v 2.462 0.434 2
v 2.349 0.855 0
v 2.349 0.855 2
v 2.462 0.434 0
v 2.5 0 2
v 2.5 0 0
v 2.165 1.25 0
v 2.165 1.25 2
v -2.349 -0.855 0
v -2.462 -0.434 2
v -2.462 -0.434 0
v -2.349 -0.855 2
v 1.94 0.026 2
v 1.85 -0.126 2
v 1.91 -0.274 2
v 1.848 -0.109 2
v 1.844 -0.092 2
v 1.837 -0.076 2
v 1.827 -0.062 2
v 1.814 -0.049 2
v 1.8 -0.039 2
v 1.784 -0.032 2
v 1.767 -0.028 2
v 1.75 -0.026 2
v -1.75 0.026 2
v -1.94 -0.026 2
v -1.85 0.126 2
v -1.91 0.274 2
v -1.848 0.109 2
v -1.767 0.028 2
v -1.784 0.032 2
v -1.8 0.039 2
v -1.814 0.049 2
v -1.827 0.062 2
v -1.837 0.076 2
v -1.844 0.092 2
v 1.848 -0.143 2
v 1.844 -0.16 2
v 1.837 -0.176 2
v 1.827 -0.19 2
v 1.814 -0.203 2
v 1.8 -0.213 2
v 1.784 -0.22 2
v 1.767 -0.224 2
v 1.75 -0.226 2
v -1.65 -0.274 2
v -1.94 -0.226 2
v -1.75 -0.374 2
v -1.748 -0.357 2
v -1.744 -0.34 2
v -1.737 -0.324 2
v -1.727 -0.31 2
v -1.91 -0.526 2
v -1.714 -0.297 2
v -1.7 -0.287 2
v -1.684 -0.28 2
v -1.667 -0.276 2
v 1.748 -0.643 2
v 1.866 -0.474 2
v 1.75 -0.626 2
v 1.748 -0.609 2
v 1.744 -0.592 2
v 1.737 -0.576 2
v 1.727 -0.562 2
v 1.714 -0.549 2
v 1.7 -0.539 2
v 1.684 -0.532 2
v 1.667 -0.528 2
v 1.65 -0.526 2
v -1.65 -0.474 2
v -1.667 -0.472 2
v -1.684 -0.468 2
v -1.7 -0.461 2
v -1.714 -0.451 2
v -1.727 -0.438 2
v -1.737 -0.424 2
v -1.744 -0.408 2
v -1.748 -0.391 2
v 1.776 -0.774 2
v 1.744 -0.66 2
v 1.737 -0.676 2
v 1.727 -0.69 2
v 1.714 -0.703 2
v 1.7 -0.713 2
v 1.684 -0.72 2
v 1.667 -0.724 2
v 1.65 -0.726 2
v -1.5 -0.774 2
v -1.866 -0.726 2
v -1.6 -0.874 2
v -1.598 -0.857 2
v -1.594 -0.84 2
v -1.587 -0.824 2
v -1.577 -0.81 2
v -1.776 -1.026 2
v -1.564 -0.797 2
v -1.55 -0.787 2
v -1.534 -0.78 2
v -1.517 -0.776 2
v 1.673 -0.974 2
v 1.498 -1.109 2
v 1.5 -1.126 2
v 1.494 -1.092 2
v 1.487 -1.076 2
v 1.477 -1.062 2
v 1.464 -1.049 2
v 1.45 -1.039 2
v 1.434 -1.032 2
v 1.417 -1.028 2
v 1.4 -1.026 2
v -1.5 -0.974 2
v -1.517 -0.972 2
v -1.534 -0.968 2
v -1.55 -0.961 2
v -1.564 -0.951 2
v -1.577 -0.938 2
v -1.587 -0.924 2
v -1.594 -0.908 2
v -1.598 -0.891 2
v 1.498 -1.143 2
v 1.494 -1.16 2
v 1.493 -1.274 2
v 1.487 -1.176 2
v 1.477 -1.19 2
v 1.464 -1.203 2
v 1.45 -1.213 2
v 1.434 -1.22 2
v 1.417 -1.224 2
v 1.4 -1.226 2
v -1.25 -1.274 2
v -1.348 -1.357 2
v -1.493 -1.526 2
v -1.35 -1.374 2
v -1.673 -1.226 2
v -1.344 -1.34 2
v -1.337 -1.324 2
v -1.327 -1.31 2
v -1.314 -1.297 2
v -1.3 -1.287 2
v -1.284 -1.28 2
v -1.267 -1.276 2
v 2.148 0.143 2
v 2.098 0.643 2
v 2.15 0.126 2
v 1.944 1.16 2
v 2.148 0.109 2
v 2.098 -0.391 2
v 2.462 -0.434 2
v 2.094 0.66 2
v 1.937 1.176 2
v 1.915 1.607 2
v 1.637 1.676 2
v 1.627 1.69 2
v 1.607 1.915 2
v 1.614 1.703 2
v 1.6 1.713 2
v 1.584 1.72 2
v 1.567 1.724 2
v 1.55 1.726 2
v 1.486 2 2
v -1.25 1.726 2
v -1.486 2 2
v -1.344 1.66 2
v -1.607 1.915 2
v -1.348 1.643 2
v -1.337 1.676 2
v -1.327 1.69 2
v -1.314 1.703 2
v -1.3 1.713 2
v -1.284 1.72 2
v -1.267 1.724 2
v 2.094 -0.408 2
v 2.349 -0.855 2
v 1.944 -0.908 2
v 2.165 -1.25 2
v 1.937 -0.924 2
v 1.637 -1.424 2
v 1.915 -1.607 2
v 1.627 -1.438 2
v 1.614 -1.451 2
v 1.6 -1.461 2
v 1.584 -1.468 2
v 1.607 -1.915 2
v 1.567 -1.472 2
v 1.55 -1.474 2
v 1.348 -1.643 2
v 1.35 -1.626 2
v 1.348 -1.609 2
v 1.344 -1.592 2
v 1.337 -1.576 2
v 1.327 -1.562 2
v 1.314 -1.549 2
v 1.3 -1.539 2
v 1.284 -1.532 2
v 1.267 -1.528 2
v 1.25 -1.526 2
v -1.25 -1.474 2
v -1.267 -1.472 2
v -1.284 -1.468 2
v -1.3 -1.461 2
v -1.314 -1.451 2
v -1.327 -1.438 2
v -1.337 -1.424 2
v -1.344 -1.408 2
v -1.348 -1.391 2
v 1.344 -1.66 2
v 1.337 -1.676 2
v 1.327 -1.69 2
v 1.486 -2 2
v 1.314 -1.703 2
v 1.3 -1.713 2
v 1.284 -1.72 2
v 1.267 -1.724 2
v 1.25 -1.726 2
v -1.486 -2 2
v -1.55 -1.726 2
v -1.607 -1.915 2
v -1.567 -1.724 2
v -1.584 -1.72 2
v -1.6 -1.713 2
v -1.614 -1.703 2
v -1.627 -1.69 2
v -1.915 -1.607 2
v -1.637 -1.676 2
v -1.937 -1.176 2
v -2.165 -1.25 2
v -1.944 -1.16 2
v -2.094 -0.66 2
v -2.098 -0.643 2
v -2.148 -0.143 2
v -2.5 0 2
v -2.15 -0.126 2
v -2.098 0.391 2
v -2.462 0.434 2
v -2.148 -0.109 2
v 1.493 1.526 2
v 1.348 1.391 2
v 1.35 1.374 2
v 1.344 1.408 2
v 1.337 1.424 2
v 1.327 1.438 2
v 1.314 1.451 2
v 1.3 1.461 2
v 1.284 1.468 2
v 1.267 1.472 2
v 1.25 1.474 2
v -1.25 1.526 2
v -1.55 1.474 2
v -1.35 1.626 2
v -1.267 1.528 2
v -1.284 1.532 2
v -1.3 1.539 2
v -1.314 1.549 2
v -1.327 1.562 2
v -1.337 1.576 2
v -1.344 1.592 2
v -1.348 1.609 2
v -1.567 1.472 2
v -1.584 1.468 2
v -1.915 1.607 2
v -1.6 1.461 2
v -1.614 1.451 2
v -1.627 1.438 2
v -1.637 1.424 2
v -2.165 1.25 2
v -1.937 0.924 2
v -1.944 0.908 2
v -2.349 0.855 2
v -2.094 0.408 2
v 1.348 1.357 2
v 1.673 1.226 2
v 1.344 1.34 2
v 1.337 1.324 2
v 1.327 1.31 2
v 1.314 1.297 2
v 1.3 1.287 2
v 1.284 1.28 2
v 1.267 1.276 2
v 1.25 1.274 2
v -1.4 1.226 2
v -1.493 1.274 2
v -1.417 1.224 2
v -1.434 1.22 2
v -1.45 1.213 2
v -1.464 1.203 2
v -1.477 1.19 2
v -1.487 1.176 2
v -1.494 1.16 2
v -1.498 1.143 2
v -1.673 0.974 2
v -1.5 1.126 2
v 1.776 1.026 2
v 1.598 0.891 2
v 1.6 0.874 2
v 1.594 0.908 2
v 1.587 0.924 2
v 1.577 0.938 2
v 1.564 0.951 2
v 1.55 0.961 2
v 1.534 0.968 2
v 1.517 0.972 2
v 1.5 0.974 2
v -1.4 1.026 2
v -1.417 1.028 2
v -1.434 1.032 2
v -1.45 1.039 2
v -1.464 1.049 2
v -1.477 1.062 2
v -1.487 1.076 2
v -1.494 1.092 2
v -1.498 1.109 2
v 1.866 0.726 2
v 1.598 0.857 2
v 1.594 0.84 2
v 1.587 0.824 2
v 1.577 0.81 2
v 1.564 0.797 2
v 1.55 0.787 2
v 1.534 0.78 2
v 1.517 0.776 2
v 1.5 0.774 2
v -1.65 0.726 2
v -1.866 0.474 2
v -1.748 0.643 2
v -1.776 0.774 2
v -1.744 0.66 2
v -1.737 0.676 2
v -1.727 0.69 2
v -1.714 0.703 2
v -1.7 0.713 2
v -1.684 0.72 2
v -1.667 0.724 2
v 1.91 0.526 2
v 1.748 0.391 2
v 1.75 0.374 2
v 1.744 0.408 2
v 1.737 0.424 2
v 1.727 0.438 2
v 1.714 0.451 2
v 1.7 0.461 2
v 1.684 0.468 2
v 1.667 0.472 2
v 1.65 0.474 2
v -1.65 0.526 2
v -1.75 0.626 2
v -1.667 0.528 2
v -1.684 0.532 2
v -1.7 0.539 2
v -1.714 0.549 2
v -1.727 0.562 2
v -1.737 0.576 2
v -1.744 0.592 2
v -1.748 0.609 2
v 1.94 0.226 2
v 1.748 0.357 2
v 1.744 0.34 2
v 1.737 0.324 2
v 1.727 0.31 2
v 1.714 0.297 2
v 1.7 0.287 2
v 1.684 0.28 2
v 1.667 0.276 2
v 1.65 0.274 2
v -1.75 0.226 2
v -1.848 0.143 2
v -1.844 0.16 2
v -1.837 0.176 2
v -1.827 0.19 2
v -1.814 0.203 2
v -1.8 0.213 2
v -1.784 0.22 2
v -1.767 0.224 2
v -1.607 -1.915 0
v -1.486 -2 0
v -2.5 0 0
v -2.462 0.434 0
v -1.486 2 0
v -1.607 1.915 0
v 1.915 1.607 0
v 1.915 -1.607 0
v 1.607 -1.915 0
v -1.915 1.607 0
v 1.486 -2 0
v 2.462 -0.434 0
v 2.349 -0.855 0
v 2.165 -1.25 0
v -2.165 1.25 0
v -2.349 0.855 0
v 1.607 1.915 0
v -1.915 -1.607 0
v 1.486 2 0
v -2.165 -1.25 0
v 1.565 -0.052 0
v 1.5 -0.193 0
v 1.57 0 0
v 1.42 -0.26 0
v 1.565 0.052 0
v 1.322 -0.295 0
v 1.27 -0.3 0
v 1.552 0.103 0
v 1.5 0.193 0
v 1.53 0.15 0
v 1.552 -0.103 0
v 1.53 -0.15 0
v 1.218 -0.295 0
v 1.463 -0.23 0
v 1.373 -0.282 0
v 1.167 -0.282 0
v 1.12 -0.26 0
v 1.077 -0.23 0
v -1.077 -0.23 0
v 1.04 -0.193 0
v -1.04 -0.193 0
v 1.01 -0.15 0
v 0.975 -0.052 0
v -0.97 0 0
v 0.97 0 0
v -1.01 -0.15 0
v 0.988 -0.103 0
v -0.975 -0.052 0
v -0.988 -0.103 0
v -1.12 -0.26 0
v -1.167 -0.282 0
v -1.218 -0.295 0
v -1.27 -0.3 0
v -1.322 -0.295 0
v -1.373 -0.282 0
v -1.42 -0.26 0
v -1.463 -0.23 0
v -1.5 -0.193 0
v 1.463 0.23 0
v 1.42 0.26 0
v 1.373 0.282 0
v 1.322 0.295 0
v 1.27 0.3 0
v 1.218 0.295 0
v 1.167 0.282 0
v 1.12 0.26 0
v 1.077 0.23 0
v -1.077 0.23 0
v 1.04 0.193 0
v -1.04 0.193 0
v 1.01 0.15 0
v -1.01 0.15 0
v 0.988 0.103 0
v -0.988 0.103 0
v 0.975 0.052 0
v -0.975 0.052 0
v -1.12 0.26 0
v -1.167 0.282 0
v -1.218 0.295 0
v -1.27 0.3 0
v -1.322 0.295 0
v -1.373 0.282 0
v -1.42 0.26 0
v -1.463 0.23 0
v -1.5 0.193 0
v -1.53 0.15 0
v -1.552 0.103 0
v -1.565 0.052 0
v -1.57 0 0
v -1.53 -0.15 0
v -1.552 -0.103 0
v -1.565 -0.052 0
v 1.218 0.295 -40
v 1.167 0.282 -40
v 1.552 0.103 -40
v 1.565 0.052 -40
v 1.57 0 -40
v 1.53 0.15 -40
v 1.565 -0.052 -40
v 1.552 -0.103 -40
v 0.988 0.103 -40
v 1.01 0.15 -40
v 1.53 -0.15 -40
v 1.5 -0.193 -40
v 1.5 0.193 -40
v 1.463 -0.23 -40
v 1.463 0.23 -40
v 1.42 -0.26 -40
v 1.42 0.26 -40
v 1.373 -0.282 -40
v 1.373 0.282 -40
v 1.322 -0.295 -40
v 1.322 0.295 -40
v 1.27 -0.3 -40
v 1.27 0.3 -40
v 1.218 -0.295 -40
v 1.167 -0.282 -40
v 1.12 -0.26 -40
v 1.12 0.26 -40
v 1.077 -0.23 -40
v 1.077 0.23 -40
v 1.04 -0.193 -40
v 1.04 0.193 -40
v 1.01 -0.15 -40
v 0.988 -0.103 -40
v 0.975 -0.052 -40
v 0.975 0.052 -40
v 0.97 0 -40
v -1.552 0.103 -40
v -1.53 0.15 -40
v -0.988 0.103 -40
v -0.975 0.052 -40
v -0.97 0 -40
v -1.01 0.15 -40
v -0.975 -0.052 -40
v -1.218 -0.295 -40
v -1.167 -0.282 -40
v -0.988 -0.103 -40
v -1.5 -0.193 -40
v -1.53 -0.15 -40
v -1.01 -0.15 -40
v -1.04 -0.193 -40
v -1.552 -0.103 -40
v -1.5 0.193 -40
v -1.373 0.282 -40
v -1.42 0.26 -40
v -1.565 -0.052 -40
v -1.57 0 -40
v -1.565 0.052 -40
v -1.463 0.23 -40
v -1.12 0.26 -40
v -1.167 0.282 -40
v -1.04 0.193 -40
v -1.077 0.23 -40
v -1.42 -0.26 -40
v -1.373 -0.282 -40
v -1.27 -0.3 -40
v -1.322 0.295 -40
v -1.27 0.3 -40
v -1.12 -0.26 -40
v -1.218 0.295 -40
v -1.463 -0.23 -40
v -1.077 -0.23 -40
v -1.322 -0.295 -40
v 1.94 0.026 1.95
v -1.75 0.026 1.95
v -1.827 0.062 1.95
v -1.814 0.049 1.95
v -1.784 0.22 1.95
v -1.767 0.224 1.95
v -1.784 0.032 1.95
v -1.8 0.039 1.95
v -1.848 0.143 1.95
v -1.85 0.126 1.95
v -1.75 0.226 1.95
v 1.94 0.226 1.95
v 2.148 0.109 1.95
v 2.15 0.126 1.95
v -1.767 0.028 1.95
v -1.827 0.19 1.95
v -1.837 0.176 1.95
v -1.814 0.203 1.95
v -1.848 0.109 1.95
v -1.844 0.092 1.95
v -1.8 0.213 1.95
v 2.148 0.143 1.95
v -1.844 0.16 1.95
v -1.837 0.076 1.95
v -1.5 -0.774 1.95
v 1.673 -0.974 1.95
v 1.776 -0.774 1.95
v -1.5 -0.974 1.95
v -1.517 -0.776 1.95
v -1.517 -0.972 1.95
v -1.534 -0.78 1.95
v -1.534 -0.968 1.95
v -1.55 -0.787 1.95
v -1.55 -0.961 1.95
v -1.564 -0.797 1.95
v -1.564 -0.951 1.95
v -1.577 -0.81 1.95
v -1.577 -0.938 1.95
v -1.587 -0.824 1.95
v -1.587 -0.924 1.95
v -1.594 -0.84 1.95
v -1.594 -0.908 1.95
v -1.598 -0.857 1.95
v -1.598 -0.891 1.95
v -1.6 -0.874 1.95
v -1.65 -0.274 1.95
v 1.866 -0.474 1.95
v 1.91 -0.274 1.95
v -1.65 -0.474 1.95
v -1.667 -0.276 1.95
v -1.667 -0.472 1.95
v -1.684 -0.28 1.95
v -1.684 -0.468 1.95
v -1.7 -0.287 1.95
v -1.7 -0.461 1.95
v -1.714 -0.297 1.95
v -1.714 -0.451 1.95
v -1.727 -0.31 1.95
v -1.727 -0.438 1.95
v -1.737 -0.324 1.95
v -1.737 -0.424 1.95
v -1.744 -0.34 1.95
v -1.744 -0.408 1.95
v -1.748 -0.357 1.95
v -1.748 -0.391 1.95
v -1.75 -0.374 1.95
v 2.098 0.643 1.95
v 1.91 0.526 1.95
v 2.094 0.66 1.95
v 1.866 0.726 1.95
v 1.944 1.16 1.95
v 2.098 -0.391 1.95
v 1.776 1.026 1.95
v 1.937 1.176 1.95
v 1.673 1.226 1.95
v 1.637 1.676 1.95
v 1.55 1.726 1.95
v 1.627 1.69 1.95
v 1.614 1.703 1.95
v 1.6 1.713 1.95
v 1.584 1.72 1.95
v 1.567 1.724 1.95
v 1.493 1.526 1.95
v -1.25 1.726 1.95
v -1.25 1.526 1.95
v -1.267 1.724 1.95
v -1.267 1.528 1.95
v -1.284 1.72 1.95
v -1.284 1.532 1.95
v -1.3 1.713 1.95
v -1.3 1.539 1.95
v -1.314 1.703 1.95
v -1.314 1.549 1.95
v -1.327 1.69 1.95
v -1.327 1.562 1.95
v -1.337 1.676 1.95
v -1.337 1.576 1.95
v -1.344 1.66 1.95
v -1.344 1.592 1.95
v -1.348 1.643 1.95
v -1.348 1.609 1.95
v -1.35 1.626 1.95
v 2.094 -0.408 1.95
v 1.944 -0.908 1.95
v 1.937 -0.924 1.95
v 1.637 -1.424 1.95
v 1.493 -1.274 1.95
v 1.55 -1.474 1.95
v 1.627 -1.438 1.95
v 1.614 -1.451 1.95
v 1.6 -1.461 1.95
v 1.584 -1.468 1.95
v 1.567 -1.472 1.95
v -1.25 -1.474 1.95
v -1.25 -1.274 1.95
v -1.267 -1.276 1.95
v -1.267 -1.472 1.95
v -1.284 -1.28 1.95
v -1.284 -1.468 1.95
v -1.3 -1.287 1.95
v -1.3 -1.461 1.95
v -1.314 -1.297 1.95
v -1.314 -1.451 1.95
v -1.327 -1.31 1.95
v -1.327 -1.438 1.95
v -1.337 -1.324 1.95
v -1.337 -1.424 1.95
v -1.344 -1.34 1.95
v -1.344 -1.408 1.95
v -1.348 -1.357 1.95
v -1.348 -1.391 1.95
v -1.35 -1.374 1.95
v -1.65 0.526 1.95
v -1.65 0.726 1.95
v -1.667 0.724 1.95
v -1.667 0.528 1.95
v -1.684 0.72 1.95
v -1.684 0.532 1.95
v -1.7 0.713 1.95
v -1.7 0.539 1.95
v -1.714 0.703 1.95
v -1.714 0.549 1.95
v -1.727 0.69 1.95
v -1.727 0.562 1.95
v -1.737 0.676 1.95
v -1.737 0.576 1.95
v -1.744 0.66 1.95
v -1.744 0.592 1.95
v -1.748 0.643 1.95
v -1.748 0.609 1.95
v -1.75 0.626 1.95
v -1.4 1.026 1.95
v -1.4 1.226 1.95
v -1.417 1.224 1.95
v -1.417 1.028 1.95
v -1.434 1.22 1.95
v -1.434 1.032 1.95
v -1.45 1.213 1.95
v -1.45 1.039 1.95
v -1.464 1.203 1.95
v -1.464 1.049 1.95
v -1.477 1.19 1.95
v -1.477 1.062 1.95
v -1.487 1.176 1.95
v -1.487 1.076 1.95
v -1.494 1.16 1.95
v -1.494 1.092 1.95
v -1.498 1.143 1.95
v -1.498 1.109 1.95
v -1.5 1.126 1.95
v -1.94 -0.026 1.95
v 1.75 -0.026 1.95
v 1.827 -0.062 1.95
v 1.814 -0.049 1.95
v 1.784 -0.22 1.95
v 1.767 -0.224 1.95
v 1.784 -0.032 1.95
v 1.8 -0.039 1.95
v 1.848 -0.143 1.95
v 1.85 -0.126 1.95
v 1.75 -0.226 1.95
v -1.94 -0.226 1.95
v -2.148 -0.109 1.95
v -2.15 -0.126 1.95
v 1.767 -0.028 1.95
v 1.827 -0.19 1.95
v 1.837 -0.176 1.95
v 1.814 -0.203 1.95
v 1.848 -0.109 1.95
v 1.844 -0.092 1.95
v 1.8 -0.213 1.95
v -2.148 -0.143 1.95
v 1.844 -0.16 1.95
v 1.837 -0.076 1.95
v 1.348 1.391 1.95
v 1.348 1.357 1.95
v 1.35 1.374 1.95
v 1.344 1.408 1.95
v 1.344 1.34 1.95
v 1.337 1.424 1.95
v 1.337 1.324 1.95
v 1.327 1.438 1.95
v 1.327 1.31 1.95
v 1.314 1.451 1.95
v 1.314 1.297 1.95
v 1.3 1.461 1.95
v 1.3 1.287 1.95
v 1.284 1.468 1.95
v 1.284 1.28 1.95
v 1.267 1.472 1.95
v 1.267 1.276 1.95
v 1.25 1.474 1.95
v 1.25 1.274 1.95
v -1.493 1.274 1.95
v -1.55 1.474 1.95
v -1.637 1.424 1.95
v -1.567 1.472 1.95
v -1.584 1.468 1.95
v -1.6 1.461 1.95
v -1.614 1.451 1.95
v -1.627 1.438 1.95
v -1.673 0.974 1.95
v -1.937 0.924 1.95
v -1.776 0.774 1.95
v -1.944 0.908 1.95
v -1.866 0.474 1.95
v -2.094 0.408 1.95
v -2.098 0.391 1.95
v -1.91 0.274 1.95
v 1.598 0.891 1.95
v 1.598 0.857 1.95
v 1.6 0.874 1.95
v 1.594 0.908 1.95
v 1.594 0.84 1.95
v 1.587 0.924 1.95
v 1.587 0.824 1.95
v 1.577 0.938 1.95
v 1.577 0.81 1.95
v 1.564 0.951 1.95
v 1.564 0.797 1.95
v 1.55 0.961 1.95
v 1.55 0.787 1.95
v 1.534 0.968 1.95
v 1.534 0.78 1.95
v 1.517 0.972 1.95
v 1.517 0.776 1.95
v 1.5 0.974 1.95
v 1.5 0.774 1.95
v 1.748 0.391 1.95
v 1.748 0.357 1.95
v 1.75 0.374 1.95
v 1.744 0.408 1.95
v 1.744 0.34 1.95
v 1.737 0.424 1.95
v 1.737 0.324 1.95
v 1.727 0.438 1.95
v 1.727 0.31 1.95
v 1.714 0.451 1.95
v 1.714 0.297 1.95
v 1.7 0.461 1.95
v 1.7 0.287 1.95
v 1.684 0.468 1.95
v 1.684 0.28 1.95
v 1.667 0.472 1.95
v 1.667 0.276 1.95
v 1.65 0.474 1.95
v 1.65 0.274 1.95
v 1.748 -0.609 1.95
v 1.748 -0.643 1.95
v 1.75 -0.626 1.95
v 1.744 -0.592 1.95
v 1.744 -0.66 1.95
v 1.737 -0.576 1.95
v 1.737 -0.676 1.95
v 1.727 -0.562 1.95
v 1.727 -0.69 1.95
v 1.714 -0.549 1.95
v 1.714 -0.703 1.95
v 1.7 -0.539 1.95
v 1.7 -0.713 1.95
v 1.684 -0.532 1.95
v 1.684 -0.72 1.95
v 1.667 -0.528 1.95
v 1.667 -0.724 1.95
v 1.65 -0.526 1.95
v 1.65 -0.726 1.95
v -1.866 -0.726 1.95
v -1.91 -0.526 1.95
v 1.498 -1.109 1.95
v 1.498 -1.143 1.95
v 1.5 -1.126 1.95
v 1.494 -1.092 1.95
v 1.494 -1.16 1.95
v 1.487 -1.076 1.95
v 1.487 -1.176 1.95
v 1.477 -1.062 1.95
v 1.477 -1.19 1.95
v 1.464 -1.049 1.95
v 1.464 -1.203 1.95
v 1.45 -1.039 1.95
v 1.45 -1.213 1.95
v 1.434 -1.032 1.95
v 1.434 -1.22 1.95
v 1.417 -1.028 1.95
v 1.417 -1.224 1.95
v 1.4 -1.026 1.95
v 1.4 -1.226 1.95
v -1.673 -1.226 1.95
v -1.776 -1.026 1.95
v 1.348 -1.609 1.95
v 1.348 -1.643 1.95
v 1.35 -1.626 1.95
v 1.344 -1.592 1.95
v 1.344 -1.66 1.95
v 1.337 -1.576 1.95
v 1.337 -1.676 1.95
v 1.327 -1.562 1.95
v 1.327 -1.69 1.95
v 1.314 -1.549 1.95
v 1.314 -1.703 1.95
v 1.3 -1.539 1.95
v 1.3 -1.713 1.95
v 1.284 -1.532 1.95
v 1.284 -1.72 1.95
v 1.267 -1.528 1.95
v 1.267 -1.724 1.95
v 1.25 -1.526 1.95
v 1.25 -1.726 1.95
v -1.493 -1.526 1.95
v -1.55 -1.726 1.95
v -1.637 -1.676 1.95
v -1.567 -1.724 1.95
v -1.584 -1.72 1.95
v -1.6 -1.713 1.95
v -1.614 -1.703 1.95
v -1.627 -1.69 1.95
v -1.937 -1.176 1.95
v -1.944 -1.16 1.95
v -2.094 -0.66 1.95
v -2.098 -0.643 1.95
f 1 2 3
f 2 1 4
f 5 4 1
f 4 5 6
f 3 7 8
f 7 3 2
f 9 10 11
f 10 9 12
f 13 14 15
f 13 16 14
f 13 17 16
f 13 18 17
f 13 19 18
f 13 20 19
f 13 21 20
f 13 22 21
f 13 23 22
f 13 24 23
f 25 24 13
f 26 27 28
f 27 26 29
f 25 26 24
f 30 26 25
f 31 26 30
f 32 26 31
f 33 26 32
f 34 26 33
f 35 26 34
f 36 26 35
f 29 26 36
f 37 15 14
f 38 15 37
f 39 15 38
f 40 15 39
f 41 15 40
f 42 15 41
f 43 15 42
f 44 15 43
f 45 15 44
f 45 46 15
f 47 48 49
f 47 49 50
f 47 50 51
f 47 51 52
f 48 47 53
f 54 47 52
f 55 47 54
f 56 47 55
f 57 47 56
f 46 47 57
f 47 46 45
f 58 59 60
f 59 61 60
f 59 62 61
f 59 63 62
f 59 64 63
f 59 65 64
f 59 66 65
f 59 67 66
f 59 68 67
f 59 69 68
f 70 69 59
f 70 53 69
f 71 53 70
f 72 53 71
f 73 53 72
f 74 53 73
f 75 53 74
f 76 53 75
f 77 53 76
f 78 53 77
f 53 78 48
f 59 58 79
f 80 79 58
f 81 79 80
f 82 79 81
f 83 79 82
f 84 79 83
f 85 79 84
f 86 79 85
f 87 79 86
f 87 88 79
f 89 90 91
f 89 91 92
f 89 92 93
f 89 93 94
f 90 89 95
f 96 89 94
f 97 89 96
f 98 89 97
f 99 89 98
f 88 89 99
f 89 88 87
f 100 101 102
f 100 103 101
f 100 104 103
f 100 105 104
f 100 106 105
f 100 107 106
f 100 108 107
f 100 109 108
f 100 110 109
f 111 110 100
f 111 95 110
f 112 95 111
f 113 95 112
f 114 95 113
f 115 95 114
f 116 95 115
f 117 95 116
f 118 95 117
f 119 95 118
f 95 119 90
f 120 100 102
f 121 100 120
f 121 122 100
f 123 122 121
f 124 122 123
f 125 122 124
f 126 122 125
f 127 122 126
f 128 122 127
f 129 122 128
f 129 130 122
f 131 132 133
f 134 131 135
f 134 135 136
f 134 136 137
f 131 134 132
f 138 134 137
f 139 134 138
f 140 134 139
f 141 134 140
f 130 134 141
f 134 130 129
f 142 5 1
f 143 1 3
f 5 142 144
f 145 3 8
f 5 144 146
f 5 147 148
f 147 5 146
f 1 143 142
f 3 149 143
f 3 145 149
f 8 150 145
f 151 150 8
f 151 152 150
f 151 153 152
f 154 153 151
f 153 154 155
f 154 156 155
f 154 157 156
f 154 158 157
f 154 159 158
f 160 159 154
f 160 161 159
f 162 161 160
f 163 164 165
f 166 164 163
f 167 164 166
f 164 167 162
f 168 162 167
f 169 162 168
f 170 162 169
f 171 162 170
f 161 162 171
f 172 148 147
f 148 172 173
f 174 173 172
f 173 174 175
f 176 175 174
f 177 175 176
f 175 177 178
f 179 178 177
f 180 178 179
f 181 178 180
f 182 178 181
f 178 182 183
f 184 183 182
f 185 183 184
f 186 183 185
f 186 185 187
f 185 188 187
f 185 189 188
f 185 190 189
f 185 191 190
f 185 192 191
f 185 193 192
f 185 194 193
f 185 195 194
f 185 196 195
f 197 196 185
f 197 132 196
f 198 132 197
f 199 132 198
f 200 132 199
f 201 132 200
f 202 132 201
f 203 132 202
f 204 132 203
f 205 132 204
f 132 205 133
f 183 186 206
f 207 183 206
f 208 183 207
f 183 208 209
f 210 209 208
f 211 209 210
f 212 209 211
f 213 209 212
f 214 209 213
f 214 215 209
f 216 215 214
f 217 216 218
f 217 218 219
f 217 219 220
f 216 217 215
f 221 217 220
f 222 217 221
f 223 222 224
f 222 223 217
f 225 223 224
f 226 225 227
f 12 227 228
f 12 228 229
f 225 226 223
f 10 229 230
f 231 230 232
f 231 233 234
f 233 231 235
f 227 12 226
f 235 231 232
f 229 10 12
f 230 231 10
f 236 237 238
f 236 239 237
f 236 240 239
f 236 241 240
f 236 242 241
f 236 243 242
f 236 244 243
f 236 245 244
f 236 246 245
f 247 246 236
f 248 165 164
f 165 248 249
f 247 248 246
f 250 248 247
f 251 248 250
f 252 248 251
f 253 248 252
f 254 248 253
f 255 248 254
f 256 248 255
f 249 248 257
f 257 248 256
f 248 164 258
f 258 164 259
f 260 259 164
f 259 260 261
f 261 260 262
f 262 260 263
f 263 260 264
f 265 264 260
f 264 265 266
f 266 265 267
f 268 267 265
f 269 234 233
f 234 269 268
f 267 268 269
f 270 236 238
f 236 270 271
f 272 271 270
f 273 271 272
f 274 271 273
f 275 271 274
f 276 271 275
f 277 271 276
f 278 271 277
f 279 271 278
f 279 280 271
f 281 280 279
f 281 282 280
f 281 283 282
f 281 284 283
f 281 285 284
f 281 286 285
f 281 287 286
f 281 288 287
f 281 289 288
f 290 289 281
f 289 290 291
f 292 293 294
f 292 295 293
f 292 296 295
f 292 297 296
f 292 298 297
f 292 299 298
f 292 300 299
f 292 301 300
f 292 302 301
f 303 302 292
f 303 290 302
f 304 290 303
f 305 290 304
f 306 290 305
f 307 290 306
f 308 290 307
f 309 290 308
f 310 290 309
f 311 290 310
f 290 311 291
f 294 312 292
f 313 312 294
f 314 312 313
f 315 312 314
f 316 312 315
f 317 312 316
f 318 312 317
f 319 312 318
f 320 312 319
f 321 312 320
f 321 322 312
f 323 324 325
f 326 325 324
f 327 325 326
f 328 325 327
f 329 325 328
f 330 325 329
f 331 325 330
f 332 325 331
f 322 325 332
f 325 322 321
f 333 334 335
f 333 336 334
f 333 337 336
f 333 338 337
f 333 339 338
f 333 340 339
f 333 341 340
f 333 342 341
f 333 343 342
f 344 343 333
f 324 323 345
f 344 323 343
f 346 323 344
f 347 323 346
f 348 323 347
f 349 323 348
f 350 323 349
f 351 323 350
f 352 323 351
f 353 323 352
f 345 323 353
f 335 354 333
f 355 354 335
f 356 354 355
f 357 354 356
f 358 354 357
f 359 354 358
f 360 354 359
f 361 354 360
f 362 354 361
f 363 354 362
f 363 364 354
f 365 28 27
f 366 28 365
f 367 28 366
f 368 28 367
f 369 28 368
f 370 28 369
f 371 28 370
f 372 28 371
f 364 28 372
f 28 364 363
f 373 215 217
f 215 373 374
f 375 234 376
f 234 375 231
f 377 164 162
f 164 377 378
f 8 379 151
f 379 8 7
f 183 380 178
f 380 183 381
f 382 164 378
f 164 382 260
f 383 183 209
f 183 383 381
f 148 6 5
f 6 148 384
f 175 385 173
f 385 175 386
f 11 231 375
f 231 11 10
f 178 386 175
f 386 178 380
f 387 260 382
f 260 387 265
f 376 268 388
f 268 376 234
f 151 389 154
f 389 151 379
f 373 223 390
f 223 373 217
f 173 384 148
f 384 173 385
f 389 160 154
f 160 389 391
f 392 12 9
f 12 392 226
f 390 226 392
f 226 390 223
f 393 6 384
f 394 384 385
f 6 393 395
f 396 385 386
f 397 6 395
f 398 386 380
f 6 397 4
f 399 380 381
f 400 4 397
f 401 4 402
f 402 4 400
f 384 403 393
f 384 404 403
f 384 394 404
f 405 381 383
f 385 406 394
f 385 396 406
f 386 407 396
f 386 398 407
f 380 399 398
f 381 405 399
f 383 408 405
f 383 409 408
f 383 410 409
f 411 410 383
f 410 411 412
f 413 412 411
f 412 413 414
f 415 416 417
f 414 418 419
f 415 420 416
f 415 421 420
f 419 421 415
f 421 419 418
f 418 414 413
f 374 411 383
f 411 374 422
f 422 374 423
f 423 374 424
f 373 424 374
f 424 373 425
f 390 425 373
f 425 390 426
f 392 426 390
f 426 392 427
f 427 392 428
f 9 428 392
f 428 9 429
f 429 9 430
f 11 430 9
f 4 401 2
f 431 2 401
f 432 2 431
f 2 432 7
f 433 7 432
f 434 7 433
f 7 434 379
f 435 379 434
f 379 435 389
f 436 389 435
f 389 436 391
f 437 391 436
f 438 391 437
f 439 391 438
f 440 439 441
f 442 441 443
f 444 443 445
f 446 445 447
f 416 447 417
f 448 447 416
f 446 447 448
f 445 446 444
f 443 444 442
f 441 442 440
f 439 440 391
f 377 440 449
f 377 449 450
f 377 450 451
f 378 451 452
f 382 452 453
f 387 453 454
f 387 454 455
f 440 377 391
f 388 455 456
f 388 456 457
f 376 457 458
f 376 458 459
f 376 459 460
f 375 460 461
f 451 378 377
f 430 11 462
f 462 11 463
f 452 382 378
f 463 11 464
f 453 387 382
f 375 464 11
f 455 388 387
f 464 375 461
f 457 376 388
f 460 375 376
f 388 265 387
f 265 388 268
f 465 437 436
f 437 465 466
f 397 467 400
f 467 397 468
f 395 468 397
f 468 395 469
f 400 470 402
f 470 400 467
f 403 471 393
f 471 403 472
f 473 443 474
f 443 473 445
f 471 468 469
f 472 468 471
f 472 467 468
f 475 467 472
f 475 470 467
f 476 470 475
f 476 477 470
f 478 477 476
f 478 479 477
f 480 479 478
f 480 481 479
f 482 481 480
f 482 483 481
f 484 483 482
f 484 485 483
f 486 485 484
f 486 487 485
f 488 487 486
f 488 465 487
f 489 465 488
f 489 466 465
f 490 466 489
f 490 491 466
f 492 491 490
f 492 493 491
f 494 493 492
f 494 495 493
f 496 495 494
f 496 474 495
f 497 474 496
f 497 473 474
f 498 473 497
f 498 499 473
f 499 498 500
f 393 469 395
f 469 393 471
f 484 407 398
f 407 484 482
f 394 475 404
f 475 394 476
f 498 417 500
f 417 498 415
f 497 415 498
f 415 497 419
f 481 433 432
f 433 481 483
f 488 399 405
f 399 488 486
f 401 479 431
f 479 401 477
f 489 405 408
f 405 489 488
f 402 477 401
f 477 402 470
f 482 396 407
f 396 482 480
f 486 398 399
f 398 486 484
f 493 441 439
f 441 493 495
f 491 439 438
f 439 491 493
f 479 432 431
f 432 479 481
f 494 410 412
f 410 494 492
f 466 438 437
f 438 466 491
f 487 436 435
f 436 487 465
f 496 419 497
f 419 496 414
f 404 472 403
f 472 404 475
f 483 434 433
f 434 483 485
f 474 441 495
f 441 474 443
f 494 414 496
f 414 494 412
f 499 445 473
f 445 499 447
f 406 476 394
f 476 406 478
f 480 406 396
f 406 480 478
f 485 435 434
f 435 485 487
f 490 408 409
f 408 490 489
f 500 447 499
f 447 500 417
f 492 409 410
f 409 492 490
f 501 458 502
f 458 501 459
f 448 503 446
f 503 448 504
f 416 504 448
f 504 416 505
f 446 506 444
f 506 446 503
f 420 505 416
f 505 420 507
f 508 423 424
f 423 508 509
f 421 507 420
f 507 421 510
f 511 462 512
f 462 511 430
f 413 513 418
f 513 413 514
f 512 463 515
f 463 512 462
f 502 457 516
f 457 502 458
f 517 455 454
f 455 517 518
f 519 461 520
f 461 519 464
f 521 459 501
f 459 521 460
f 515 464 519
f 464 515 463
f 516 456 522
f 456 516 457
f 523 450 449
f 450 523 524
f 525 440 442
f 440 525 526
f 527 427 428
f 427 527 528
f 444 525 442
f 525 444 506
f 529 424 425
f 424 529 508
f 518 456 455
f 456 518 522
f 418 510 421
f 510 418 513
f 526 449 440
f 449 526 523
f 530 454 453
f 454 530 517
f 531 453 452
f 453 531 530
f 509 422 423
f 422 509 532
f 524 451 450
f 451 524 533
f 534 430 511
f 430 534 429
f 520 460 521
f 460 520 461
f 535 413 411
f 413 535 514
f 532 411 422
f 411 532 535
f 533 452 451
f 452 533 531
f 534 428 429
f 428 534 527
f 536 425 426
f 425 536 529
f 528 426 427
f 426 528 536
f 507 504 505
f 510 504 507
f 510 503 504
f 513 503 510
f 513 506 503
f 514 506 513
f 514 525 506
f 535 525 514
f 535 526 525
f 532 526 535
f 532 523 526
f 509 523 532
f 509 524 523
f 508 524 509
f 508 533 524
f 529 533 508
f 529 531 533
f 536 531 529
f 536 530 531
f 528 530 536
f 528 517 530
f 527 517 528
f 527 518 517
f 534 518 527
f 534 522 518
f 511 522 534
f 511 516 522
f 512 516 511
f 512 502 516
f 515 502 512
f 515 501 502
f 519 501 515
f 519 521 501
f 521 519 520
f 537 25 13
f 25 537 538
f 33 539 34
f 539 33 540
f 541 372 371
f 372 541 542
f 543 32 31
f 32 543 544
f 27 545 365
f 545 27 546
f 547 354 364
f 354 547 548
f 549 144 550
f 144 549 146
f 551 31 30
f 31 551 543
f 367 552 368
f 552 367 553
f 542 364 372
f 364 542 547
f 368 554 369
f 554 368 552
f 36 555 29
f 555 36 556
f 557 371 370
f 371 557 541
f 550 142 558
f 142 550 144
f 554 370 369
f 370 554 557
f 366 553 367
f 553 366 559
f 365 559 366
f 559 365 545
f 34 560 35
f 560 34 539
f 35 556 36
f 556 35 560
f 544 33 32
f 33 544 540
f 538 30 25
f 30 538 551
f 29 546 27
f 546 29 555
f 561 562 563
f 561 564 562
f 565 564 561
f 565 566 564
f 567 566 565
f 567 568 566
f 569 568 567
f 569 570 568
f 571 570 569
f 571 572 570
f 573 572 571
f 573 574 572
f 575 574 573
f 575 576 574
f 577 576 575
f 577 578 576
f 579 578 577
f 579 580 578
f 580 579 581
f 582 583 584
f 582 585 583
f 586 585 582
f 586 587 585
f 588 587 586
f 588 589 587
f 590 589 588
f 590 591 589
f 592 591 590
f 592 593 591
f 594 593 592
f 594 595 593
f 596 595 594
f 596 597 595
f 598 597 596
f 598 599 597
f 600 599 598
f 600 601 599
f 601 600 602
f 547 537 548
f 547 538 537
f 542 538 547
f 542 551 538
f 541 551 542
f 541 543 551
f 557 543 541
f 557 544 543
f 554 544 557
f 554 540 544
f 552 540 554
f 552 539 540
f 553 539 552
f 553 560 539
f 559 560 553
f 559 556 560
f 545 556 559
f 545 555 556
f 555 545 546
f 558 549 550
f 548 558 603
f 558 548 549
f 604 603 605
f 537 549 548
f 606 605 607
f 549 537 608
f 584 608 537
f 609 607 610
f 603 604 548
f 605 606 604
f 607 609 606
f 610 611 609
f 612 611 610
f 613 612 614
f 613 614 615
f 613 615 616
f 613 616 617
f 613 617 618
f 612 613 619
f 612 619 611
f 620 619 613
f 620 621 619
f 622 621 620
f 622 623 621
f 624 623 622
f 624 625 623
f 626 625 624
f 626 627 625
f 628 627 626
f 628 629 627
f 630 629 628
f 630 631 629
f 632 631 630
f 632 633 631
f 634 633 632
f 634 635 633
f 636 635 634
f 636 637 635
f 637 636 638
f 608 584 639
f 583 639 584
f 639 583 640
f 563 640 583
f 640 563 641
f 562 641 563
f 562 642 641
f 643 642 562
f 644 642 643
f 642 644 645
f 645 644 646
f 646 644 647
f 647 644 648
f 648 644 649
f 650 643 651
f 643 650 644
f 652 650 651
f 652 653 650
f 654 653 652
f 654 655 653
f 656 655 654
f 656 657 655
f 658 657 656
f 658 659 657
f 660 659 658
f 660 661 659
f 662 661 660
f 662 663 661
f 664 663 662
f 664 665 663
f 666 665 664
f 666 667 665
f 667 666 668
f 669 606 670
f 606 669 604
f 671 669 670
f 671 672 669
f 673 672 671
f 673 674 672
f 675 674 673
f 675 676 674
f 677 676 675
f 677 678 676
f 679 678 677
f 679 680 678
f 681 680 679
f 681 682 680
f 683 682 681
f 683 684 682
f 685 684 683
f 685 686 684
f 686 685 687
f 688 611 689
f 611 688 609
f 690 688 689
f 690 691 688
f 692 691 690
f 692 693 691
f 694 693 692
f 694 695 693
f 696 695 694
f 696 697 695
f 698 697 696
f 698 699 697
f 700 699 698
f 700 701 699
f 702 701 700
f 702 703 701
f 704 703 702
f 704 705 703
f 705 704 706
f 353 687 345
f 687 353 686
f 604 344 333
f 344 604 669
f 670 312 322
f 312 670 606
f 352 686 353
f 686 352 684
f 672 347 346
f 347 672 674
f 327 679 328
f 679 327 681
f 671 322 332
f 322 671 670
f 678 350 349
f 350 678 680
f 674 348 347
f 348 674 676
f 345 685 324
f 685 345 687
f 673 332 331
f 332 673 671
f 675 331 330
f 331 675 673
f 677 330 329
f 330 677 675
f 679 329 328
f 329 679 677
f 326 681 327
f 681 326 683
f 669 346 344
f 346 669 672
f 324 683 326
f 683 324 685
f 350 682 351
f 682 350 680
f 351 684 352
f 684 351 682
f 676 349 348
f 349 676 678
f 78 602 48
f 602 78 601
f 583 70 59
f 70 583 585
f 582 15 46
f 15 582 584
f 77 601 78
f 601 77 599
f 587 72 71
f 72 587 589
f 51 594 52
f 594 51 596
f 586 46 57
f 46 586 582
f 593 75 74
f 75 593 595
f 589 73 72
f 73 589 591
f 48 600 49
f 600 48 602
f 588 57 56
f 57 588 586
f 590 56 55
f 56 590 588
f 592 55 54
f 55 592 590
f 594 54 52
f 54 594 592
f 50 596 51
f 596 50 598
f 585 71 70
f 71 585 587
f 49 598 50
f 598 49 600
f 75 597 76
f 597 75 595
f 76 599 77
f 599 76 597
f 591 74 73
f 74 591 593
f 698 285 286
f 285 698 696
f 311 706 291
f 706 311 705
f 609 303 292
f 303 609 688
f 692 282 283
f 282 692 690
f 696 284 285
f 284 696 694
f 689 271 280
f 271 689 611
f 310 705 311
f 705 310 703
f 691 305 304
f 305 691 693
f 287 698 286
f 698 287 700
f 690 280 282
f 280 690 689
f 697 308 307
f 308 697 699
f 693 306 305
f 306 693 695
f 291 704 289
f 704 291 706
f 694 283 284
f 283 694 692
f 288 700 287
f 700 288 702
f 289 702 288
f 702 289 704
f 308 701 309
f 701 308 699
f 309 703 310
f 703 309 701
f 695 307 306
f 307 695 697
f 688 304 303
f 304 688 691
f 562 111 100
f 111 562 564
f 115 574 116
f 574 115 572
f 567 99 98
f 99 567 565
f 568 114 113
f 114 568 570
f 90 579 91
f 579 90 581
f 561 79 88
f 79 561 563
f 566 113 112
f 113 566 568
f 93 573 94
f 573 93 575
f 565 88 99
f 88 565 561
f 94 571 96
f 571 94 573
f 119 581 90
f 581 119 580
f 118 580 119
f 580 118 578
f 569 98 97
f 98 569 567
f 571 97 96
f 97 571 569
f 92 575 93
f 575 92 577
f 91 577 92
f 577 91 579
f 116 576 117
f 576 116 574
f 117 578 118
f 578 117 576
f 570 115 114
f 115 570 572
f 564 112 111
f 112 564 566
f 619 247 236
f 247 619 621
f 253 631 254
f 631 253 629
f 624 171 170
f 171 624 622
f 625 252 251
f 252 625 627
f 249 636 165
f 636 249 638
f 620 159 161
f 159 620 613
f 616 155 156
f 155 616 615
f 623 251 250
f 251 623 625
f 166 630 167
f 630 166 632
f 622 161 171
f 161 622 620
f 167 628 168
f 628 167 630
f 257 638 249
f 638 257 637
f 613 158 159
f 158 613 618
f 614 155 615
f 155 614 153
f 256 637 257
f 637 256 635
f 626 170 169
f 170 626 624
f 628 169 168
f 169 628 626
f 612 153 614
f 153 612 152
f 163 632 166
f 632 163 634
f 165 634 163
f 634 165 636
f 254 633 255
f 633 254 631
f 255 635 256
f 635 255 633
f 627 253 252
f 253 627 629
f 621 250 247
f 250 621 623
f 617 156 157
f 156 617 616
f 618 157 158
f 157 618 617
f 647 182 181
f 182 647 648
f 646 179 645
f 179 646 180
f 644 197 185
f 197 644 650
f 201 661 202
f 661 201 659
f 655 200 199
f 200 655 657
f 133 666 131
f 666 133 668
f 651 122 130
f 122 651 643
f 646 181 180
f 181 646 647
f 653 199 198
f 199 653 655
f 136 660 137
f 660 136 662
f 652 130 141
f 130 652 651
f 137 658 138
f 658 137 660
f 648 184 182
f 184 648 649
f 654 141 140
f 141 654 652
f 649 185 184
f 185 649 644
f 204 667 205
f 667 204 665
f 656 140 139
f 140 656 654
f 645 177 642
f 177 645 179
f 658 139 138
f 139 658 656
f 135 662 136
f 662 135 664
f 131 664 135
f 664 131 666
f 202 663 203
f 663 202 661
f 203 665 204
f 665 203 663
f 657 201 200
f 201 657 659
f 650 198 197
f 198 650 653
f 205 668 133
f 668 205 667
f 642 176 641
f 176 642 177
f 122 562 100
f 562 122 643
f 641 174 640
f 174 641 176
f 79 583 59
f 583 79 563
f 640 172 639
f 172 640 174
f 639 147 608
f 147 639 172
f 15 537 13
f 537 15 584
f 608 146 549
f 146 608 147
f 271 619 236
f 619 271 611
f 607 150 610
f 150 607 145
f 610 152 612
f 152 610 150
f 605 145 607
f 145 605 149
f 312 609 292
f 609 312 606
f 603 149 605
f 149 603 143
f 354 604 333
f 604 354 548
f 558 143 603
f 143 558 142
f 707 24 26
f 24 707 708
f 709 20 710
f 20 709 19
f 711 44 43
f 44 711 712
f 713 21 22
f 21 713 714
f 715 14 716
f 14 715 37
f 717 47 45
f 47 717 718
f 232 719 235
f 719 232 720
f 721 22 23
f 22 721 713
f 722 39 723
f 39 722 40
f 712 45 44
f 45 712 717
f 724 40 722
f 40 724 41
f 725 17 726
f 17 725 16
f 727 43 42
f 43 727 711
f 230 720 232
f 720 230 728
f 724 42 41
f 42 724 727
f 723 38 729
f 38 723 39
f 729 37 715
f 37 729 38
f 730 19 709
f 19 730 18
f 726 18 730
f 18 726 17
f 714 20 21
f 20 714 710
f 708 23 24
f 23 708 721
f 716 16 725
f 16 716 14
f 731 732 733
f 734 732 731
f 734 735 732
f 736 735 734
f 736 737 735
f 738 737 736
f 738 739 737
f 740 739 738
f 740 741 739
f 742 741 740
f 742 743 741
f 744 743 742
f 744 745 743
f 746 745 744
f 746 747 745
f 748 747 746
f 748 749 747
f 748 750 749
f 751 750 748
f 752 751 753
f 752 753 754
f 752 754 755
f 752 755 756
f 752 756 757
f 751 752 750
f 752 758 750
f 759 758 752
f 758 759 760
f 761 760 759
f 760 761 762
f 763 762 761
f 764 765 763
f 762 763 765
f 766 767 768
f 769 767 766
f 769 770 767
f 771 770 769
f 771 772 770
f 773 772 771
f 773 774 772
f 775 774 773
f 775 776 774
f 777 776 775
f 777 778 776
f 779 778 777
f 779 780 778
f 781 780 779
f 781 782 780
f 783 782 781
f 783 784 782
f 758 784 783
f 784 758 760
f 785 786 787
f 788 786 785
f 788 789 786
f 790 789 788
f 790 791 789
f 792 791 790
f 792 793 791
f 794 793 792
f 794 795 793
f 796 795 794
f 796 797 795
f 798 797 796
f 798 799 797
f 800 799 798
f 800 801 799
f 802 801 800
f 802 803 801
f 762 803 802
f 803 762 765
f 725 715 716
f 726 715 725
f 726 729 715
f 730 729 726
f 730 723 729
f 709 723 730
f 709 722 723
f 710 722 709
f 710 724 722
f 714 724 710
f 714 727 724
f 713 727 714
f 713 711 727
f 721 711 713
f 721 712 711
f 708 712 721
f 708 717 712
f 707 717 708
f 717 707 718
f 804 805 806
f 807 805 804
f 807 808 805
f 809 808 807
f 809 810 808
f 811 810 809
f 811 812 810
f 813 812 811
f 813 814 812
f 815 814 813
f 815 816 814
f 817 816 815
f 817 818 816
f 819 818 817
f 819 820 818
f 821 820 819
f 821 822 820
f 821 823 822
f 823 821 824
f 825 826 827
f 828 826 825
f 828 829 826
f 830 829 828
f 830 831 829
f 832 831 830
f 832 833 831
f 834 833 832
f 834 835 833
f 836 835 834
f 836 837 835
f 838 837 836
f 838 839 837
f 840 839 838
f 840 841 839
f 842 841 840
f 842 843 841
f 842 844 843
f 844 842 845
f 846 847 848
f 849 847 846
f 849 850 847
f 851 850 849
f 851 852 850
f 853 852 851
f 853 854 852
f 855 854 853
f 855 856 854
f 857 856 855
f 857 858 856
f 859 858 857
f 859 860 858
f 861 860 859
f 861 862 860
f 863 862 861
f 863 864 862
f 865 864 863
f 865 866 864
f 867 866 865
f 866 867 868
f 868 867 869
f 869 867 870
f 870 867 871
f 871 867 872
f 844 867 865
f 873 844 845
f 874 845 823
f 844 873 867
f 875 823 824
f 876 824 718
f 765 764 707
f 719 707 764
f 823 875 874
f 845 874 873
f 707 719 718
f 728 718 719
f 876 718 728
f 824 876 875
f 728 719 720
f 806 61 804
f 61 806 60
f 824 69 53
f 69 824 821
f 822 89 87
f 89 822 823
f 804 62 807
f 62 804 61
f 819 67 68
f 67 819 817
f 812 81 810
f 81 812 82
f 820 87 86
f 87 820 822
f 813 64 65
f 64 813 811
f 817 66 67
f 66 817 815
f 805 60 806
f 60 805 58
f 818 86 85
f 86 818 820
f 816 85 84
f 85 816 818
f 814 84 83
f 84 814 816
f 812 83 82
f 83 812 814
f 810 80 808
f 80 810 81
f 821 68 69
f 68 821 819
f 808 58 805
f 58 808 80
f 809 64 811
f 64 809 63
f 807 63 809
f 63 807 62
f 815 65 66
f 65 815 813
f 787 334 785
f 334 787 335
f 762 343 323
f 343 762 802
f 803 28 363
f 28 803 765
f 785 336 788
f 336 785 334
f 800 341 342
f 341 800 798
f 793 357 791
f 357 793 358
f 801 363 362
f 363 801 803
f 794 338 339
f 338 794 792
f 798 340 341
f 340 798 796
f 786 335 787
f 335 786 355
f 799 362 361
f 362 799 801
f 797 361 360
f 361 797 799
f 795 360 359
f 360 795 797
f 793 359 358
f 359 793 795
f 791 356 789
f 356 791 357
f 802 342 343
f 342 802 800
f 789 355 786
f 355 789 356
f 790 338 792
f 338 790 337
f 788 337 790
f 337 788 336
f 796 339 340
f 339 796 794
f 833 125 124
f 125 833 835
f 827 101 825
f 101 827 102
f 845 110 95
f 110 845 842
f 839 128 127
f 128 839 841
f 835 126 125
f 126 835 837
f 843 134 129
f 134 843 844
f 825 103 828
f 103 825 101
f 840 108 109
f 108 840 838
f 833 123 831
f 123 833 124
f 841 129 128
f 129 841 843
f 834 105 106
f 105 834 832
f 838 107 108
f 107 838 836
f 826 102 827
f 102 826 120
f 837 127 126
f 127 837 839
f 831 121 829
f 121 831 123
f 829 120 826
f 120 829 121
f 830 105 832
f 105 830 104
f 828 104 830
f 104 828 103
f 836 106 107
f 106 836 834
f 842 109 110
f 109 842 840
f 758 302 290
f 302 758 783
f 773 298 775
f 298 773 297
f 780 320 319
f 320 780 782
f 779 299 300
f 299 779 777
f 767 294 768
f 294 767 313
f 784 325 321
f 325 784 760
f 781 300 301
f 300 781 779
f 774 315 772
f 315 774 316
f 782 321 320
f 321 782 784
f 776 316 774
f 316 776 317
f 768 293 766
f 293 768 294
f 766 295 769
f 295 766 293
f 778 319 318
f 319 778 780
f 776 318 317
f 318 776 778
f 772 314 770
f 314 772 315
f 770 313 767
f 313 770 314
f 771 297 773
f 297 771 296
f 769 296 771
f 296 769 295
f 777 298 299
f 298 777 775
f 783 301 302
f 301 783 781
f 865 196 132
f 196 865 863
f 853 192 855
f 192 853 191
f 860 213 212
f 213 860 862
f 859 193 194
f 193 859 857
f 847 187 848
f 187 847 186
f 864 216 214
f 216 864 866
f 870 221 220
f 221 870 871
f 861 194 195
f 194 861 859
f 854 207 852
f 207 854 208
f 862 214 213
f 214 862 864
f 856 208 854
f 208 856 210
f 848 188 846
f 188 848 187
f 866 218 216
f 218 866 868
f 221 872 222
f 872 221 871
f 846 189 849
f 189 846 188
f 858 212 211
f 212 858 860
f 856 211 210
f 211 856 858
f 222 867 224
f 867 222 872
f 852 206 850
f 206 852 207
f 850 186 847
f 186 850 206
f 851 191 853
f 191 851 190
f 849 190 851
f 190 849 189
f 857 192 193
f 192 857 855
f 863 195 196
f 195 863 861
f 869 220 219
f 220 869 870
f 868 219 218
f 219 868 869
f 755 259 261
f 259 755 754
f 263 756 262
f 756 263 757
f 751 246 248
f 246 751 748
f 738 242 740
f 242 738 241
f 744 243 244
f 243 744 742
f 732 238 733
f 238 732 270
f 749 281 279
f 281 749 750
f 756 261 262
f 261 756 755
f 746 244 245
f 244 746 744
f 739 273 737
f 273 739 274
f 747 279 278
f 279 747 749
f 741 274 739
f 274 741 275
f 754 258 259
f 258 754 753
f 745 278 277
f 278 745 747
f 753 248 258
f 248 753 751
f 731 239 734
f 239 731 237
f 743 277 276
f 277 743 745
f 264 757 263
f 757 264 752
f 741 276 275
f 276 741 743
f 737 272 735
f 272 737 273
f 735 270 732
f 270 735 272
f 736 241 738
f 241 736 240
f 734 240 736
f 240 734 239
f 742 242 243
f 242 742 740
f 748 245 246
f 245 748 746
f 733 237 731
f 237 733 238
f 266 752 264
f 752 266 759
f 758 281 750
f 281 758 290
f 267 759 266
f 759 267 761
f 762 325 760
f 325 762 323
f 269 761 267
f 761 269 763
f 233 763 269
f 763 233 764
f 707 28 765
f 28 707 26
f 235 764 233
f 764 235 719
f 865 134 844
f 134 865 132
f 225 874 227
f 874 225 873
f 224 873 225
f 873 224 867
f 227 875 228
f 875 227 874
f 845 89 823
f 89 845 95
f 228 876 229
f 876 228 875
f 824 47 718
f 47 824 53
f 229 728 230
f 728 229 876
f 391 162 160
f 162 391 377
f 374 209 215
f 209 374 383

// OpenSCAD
$fn=36;


module traks()
  translate([0.15,0,0])
  {
  color("Silver")
    hull()
      {
        translate([1.9,0,1.95])
          cylinder(d=0.2,h=0.1);
        translate([-1.9,0,1.95])
          cylinder(d=0.2,h=0.1);
      }

  translate([0,0.5,0])
    color("Silver")
      hull()
        {
        translate([1.8,0,1.95])
          cylinder(d=0.2,h=0.1);
        translate([-1.8,0,1.95])
          cylinder(d=0.2,h=0.1);
        }
translate([0,-0.5,0])
    color("Silver")
      hull()
        {
        translate([1.8,0,1.95])
          cylinder(d=0.2,h=0.1);
        translate([-1.8,0,1.95])
          cylinder(d=0.2,h=0.1);
        }
  
  translate([0,1,0])
    color("Silver")
      hull()
        {
        translate([1.65,0,1.95])
          cylinder(d=0.2,h=0.1);
        translate([-1.55,0,1.95])
          cylinder(d=0.2,h=0.1);
        }
translate([0,-1,0])
    color("Silver")
      hull()
        {
        translate([1.65,0,1.95])
          cylinder(d=0.2,h=0.1);
        translate([-1.65,0,1.95])
          cylinder(d=0.2,h=0.1);
        }

  translate([0,1.5,0])
    color("Silver")
      hull()
        {
        translate([1.4,0,1.95])
          cylinder(d=0.2,h=0.1);
        translate([-1.4,0,1.95])
          cylinder(d=0.2,h=0.1);
        }
translate([0,-1.5,0])
    color("Silver")
      hull()
        {
        translate([1.4,0,1.95])
          cylinder(d=0.2,h=0.1);
        translate([-1.4,0,1.95])
          cylinder(d=0.2,h=0.1);
        }

translate([0,-1.5,0])
    color("Silver")
      hull()
        {
        translate([1.4,0,1.95])
          cylinder(d=0.2,h=0.1);
        translate([1.7,0.5,1.95])
          cylinder(d=0.2,h=0.1);
        }
translate([0,-1,0])
    color("Silver")
      hull()
        {
        translate([1.7,0,1.95])
          cylinder(d=0.2,h=0.1);
        translate([1.85,0.5,1.95])
          cylinder(d=0.2,h=0.1);
        }
translate([0,-0.5,0])
    color("Silver")
      hull()
        {
        translate([1.85,0,1.95])
          cylinder(d=0.2,h=0.1);
        translate([1.9,0.5,1.95])
          cylinder(d=0.2,h=0.1);
        }
translate([0,1.5,0])
    color("Silver")
      hull()
        {
        translate([1.4,0,1.95])
          cylinder(d=0.2,h=0.1);
        translate([1.7,-0.5,1.95])
          cylinder(d=0.2,h=0.1);
        }
translate([0,1,0])
    color("Silver")
      hull()
        {
        translate([1.7,0,1.95])
          cylinder(d=0.2,h=0.1);
        translate([1.85,-0.5,1.95])
          cylinder(d=0.2,h=0.1);
        }
translate([0,0.5,0])
    color("Silver")
      hull()
        {
        translate([1.85,0,1.95])
          cylinder(d=0.2,h=0.1);
        translate([1.9,-0.5,1.95])
          cylinder(d=0.2,h=0.1);
        }
  }

module LDR()
difference()
  {
  union()
    {
    color("SaddleBrown")
    translate([0,0,0])
      cylinder(d=5,h=2);

    color("Silver")
      translate([1.27,0,-40])
        cylinder(d=0.6,h=40);
    color("Silver")
      translate([-1.27,0,-40])
        cylinder(d=0.6,h=40);

    }
color("SaddleBrown")
  translate([0,7,0])
    cube([10,10,10],center=true);
color("SaddleBrown")
  translate([0,-7,0])
    cube([10,10,10],center=true);

  color("Silver")
    translate([0,0.126,0])
      traks();

color("Silver")
  translate([0,-0.126,0])
    rotate([0,0,180])
      traks();
  }


LDR();
